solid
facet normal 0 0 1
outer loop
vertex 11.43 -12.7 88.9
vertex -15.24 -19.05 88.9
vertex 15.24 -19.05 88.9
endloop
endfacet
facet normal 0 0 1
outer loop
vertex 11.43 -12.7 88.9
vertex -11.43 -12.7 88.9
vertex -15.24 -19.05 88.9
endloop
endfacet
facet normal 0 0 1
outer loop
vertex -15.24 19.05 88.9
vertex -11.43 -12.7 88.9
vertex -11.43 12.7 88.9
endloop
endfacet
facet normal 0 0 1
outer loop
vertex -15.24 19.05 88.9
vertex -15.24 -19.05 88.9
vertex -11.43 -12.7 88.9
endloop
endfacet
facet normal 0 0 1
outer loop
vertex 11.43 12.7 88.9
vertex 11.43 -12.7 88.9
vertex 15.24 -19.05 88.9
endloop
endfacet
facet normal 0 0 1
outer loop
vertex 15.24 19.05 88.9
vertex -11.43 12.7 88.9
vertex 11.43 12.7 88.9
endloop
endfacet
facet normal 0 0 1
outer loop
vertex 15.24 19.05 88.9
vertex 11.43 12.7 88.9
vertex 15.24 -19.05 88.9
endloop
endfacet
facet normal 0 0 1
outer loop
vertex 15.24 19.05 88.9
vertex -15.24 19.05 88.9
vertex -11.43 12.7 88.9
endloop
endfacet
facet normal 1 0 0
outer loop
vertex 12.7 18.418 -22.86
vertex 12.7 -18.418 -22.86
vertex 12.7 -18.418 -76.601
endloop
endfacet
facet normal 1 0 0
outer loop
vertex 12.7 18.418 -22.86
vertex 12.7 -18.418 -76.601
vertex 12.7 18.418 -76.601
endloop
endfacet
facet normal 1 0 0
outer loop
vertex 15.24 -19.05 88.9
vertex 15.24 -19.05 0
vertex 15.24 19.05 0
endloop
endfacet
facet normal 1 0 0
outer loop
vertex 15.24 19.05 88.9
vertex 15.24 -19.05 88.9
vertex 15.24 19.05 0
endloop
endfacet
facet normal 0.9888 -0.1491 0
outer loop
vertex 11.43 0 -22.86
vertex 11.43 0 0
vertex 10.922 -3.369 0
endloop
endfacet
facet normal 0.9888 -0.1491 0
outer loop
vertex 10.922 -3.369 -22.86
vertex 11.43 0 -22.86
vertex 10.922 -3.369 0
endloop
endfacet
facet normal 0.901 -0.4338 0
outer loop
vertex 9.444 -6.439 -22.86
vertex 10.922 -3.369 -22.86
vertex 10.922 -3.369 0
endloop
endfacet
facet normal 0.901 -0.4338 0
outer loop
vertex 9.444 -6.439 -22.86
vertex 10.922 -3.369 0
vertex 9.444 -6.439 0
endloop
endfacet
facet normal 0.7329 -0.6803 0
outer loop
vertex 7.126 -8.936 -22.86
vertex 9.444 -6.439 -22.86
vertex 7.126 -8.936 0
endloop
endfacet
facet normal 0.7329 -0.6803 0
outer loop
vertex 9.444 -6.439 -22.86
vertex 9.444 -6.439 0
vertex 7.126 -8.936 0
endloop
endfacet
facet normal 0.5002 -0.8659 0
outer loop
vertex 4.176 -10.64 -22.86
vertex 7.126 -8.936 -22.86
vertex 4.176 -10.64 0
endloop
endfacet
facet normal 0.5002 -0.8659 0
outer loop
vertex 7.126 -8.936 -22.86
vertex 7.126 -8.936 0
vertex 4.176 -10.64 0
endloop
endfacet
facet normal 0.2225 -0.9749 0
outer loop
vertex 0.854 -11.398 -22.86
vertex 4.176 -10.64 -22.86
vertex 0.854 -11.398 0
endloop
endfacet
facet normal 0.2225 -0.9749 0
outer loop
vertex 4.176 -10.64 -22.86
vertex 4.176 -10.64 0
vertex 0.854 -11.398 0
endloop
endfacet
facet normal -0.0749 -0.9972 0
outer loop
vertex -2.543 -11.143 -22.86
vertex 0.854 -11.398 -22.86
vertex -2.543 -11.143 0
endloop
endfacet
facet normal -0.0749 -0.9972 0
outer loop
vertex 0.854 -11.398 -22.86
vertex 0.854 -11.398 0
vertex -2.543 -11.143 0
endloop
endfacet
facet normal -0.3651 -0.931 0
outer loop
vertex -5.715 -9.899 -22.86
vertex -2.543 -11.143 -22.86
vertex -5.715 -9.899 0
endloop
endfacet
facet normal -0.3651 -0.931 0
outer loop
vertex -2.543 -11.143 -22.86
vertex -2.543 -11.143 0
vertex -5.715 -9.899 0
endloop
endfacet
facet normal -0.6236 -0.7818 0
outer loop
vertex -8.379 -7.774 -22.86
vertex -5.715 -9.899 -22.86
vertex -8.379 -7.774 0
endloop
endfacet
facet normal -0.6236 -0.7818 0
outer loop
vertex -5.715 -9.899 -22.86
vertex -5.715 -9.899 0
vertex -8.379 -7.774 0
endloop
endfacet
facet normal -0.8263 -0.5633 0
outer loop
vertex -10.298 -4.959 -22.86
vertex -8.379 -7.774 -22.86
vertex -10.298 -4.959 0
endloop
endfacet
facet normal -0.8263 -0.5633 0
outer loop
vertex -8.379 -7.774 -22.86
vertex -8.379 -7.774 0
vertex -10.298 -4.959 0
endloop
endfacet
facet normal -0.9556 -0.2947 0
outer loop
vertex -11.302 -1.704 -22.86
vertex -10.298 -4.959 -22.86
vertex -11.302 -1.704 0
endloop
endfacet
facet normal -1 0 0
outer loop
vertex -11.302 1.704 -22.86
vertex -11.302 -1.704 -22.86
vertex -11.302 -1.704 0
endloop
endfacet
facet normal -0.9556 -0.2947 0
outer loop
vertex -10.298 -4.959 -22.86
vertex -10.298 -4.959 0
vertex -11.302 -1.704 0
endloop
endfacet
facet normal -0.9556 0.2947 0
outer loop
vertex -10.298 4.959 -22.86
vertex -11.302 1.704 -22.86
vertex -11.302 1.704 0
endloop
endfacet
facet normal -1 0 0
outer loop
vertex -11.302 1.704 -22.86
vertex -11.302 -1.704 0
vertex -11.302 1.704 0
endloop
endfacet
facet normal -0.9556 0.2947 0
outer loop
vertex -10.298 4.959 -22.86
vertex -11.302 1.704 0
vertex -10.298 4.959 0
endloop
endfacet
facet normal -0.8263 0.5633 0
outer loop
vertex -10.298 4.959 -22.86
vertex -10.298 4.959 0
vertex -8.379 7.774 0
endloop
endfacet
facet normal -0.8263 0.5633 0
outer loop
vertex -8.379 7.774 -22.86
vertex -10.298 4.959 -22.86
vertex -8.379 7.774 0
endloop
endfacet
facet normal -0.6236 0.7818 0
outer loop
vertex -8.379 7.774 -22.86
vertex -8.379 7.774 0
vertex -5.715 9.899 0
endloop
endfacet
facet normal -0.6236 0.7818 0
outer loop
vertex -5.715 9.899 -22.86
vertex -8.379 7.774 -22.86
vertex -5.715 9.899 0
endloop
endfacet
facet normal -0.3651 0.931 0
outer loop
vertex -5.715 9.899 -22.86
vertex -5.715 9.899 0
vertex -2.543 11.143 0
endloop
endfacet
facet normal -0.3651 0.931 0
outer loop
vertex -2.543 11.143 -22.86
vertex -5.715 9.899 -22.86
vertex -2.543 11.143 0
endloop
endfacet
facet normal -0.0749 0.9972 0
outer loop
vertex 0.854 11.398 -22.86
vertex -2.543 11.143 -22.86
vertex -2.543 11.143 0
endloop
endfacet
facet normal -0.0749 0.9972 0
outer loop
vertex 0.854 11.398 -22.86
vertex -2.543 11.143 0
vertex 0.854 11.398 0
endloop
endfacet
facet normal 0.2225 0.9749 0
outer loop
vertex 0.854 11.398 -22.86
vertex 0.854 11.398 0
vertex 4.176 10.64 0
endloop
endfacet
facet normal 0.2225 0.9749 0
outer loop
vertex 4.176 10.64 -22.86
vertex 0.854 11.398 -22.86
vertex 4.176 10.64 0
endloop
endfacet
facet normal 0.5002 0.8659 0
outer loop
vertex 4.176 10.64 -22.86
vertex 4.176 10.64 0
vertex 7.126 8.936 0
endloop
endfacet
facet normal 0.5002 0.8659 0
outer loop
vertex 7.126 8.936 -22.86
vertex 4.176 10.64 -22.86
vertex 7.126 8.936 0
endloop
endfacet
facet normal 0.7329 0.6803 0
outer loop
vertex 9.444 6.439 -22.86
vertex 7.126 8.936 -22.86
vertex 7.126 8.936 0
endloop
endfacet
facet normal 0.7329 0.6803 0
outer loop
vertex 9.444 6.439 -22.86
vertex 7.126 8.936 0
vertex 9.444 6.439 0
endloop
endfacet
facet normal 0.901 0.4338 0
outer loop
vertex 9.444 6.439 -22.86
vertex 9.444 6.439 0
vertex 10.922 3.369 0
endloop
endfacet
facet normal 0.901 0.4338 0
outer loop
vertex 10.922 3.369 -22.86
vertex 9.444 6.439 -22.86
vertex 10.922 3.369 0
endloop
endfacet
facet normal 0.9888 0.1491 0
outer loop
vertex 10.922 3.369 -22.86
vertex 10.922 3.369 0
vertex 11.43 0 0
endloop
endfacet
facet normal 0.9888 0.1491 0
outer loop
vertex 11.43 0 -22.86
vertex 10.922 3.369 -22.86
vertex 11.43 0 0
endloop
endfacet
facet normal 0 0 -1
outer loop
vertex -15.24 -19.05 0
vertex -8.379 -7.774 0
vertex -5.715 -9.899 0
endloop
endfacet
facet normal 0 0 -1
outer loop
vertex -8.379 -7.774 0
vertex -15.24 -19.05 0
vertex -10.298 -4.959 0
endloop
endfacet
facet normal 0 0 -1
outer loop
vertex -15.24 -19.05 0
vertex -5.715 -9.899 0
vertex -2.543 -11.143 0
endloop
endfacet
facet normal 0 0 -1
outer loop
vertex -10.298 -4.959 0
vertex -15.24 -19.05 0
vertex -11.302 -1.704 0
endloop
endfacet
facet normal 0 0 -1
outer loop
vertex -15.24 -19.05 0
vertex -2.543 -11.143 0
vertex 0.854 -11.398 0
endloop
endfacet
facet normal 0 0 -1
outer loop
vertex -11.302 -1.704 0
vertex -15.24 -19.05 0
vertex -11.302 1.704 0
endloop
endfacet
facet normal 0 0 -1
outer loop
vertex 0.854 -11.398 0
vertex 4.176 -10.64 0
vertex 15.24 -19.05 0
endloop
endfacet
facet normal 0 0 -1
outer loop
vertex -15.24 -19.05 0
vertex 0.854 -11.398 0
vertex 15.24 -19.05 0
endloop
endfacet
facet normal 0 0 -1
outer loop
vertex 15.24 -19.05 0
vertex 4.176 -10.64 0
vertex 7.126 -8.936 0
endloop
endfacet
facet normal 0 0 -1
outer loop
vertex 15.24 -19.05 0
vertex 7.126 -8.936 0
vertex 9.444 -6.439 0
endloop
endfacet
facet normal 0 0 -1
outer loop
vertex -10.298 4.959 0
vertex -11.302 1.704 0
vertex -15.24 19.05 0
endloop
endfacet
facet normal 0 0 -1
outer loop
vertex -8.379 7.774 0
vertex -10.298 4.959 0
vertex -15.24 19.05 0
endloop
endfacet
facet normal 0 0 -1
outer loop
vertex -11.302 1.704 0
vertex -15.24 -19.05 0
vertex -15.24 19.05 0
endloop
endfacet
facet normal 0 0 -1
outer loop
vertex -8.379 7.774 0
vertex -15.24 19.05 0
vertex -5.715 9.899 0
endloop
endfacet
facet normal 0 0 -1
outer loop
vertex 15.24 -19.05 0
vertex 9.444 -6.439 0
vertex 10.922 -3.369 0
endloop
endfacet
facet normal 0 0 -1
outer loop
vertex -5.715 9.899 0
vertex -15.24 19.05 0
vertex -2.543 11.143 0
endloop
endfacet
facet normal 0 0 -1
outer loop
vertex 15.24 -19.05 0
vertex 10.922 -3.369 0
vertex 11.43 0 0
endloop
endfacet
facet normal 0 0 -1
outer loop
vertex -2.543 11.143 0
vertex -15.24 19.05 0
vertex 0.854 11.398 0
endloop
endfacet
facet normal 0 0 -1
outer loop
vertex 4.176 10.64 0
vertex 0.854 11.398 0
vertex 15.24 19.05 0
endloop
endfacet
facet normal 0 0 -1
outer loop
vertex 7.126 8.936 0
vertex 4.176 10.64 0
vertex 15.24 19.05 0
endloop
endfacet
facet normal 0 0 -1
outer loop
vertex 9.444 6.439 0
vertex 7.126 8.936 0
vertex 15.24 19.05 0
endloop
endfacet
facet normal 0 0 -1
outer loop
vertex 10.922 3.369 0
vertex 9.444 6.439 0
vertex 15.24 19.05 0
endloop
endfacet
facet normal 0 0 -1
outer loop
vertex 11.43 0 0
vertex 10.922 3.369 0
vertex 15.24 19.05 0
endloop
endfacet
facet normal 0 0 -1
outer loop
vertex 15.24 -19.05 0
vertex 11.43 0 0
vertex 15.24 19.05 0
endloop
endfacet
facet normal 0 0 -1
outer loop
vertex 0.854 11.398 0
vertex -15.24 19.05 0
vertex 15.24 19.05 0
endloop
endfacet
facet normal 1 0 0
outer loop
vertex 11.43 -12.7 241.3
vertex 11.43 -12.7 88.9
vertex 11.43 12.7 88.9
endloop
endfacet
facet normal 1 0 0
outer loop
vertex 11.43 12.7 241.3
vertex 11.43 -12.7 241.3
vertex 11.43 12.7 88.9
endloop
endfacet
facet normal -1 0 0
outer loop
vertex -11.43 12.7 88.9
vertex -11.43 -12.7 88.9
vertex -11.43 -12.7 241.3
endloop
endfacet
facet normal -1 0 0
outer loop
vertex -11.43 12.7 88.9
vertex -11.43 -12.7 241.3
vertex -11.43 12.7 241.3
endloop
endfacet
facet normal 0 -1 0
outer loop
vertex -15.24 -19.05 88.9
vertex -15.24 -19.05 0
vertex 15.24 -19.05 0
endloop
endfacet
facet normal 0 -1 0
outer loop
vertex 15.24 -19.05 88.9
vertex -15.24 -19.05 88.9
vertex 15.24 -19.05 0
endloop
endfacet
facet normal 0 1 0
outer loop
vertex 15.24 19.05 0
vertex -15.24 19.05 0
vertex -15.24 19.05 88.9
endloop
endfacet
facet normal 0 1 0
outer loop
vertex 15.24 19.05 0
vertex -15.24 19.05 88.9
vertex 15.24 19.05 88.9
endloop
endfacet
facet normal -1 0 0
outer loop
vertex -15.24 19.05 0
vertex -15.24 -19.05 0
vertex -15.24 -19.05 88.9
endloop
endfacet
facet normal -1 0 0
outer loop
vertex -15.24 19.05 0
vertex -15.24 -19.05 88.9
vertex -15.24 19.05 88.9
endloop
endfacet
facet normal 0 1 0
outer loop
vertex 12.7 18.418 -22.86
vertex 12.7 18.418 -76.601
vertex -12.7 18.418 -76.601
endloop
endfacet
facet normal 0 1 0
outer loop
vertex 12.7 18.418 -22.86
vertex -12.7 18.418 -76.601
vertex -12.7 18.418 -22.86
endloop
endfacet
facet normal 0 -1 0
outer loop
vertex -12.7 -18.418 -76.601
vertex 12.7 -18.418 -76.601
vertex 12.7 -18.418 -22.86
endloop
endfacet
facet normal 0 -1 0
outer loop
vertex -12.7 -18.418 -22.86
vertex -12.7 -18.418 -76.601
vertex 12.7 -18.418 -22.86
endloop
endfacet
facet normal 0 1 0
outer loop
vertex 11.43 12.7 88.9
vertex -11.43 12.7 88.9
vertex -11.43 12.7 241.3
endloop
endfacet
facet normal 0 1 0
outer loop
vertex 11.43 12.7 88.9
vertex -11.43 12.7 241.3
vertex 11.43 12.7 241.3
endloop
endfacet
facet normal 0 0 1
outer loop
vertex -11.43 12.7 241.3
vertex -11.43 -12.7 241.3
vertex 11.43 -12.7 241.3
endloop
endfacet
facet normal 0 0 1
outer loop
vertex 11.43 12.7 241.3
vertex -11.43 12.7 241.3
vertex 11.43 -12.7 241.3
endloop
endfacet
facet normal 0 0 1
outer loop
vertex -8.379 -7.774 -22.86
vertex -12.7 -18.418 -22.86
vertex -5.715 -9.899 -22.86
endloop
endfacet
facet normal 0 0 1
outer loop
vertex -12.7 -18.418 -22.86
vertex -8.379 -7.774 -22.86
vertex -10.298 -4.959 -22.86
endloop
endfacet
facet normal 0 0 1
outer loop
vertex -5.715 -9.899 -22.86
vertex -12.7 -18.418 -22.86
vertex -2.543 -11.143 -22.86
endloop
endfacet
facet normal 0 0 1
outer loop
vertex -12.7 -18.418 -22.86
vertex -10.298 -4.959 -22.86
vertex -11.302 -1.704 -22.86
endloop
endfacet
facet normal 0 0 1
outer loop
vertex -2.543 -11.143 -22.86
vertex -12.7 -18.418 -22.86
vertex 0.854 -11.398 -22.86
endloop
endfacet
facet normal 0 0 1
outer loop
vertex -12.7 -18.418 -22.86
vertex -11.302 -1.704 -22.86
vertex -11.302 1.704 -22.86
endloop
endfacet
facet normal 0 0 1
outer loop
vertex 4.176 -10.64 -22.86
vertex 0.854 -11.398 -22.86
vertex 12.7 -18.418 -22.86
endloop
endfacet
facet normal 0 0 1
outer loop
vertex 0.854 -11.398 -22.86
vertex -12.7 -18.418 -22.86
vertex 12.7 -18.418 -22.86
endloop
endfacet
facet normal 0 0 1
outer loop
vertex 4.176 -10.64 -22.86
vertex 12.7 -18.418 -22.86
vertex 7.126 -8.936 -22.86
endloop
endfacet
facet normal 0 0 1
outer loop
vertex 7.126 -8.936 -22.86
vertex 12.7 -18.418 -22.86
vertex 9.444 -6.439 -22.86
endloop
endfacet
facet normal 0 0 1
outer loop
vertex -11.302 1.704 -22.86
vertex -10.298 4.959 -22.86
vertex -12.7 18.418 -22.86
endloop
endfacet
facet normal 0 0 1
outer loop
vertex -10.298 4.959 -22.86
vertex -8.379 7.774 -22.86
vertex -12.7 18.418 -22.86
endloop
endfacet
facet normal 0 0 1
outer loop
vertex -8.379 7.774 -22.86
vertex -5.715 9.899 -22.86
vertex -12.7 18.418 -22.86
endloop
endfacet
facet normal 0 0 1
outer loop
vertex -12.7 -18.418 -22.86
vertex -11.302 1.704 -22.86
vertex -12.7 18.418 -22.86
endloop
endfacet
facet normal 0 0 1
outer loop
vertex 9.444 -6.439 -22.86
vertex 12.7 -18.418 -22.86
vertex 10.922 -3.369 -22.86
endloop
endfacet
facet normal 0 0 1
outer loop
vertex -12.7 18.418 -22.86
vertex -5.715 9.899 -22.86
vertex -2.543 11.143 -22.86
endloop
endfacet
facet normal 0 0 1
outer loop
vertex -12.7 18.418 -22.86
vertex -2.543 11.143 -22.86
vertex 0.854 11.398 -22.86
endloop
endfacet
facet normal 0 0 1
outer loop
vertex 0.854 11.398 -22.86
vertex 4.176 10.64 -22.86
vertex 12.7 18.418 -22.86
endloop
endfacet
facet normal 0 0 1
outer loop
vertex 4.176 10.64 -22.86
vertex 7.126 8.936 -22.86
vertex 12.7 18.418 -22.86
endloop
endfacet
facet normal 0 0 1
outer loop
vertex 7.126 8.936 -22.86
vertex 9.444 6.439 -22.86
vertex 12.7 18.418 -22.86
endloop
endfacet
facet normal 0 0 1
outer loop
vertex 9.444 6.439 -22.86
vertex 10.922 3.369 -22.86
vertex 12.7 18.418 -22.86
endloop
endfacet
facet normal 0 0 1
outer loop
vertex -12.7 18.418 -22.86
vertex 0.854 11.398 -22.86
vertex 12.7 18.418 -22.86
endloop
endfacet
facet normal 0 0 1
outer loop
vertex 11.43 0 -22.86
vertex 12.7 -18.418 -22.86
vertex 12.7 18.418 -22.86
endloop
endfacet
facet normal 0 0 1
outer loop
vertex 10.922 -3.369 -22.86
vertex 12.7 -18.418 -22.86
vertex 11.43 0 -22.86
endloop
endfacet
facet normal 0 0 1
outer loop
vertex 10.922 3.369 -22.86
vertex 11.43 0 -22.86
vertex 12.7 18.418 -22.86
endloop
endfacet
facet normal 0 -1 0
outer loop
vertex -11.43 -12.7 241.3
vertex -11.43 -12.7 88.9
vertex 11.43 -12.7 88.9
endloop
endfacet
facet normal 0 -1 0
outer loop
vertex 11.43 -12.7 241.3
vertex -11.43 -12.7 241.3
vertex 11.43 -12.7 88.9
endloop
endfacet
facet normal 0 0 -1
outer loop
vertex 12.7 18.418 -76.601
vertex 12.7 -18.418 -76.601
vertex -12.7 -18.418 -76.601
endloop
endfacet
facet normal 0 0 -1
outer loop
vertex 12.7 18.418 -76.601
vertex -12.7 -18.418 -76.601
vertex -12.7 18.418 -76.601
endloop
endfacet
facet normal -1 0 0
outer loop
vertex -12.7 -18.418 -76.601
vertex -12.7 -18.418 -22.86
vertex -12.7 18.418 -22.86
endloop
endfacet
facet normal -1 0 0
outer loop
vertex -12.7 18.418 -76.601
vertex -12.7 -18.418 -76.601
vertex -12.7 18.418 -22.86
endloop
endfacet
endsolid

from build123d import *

# Parameters (mm, degrees)
F0_W     = 30.48
F0_H     = 38.1
F1_DEPTH = 88.9
F2_W     = 22.86
F2_H     = 25.4
F3_DEPTH = 152.4
F4_R     = 11.43
F5_DEPTH = 22.86
F6_W     = 36.83582
F6_H     = 53.741386
F7_DEPTH = 12.7
F8_DEPTH = 12.7


with BuildPart() as f1:
    # F0 (on Top) → F1 (new body)
    with BuildSketch(Plane.XY):
        Rectangle(F0_W, F0_H)
    extrude(amount=F1_DEPTH)

    # F2 (on face) → F3 (join)
    with BuildSketch(Plane.XY.offset(88.9)):
        Rectangle(F2_W, F2_H)
    extrude(amount=F3_DEPTH)

    # F4 (on face) → F5 (join)
    with BuildSketch(Plane(origin=(0, 0, 0), x_dir=(1, 0, 0), z_dir=(0, 0, -1))):
        Circle(F4_R)
    extrude(amount=F5_DEPTH)

    # F6 (on Right) → F7 (join)
    with BuildSketch(Plane.YZ):
        with Locations((0, -49.730693)):
            Rectangle(F6_W, F6_H)
    extrude(amount=F7_DEPTH)

    # F6 (on Right) → F8 (join)
    with BuildSketch(Plane.YZ):
        with Locations((0, -49.730693)):
            Rectangle(F6_W, F6_H)
    extrude(amount=-F8_DEPTH)


solid = f1.part
